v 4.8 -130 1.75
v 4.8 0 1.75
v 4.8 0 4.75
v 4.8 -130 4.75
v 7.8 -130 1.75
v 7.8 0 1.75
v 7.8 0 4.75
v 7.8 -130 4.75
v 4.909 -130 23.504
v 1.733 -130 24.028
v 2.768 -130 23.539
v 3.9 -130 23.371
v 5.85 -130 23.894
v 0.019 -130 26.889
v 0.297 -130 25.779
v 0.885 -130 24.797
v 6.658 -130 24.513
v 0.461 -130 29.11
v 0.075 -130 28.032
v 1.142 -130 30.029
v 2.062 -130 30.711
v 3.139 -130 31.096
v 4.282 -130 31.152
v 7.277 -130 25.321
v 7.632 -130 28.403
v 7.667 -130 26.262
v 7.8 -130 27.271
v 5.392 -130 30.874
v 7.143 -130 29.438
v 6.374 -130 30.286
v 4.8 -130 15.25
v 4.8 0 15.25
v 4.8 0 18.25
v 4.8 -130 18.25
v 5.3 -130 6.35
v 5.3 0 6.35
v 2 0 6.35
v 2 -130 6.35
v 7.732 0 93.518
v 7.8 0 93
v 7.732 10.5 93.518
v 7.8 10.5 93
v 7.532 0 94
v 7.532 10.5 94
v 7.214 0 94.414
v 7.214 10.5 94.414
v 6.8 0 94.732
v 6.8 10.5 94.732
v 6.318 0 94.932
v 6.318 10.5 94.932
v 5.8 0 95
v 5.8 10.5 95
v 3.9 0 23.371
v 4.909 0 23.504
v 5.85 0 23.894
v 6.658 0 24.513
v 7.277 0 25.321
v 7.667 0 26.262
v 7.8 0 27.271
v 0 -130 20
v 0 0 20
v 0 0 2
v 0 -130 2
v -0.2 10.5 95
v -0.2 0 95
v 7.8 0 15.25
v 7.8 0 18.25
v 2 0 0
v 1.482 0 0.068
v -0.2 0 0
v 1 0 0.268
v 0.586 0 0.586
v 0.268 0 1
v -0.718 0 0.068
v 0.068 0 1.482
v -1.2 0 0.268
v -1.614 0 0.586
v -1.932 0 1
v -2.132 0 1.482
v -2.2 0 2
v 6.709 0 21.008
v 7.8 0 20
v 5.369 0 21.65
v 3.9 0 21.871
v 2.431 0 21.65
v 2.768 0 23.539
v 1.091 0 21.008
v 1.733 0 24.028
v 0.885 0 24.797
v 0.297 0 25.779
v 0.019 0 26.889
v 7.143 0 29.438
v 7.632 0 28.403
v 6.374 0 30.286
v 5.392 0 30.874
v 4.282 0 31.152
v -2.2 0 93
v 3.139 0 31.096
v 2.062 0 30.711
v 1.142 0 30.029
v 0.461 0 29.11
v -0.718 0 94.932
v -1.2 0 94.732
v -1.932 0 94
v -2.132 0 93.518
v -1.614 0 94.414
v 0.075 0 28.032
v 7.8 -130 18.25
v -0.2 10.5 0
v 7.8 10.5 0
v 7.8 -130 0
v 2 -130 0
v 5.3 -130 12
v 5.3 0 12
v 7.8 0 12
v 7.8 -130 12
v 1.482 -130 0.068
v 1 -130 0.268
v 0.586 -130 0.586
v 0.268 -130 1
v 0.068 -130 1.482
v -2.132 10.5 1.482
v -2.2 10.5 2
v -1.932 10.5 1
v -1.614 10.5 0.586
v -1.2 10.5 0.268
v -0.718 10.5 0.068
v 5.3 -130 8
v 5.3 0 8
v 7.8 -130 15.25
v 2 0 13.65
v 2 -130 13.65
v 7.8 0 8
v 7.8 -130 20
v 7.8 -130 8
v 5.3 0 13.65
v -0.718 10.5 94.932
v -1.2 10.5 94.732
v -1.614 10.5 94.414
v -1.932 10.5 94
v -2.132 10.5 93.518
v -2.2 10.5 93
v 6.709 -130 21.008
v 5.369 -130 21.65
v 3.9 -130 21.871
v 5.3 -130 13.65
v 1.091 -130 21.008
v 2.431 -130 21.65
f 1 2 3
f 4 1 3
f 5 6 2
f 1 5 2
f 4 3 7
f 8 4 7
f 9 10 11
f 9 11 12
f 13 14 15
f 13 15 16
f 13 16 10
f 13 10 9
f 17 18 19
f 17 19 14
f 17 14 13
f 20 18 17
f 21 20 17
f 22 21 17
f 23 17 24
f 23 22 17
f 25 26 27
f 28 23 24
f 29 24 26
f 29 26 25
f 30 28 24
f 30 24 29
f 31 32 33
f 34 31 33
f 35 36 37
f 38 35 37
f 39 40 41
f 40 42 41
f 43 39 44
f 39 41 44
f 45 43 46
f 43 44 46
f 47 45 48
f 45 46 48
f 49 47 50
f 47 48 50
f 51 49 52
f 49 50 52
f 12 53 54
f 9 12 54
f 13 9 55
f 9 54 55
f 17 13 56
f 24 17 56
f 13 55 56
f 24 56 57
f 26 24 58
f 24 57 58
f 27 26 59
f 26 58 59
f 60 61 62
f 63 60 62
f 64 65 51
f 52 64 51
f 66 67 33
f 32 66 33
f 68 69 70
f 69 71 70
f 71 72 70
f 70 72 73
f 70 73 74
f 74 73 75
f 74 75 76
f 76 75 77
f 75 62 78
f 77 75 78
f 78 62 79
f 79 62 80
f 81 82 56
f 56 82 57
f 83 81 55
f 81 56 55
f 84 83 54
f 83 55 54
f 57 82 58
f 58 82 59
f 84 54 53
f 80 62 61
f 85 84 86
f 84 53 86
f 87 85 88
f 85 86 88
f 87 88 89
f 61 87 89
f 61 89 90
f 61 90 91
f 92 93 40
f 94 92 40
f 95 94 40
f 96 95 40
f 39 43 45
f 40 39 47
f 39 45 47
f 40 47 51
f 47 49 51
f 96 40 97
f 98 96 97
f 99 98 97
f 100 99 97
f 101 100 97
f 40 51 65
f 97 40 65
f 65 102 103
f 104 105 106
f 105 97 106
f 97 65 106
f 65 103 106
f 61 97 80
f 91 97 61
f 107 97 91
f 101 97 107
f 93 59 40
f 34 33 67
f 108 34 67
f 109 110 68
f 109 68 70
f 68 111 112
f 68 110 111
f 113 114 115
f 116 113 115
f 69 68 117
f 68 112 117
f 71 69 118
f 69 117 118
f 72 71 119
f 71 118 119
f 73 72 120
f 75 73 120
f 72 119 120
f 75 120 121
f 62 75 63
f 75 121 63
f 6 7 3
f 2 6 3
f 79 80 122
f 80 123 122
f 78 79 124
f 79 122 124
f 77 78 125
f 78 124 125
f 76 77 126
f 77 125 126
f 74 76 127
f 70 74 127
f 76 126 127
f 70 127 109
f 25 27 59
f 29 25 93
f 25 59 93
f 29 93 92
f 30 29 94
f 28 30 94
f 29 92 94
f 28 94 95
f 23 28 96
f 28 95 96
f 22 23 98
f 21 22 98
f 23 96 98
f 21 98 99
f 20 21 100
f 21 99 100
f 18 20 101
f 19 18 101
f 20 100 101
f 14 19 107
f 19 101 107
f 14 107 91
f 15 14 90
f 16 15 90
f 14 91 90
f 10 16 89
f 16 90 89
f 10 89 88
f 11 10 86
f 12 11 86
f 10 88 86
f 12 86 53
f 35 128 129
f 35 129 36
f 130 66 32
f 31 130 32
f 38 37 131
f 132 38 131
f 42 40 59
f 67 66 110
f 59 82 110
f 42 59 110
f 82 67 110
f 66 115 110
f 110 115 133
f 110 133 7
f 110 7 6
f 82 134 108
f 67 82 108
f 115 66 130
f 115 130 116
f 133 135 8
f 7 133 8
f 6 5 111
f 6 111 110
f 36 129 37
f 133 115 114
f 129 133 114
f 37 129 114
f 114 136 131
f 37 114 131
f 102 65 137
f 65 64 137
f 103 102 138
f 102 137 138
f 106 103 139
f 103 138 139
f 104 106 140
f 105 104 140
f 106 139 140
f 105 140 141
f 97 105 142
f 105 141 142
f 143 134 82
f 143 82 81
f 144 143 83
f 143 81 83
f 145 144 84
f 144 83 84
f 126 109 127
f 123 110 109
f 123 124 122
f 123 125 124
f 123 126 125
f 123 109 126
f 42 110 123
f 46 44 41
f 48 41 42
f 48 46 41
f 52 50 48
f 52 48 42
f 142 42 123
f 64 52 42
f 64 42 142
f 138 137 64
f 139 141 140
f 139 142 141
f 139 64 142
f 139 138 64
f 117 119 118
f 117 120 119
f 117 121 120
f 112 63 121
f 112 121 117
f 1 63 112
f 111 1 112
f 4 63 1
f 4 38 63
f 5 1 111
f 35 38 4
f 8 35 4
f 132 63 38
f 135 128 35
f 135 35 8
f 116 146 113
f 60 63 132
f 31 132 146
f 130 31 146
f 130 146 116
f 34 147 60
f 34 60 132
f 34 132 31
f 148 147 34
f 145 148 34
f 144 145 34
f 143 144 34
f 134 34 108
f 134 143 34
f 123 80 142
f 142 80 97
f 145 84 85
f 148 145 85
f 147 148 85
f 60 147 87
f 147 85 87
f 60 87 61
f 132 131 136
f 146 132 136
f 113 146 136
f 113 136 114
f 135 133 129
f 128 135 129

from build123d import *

# Parameters (mm, degrees)
F1_DEPTH = 130
F2_W     = 7.8
F2_H     = 75
F2_H_2   = 20
F3_DEPTH = 10.5
F5_DEPTH = 130
F6_R     = 2
F7_R     = 2


with BuildPart() as f1:
    # F0 (on Front) → F1 (new body)
    with BuildSketch(Plane.XZ):
        Polygon((0, 10), (0, 0), (7.8, 0), (7.8, 1.75), (4.8, 1.75), (4.8, 4.75), (7.8, 4.75), (7.8, 8), (5.3, 8), (5.3, 6.35), (2, 6.35), (2, 10), align=None)
        Polygon((0, 20), (0, 10), (2, 10), (2, 13.65), (5.3, 13.65), (5.3, 12), (7.8, 12), (7.8, 15.25), (4.8, 15.25), (4.8, 18.25), (7.8, 18.25), (7.8, 20), align=None)
    extrude(amount=F1_DEPTH)

    # F2 (on face) → F3 (join)
    with BuildSketch(Plane(origin=(0, 0, 0), x_dir=(-1, 0, 0), z_dir=(0, 1, 0))):
        with Locations((-3.9, 57.5)):
            Rectangle(F2_W, F2_H)
        with Locations((-3.9, 10)):
            Rectangle(F2_W, F2_H_2)
        Polygon((0, 95), (0, 20), (0, 0), (2.2, 0), (2.2, 95), align=None)
    extrude(amount=F3_DEPTH)

    # F4 (on face) → F5 (join, through all)
    with BuildSketch(Plane.XZ):
        with BuildLine():
            Line((3.9, 20), (7.8, 20))
            ThreePointArc((7.8, 20), (6.062812, 21.379122), (3.9, 21.871102))
            Line((3.9, 21.871102), (3.9, 20))
        make_face()
        with BuildLine():
            Line((3.9, 20), (3.9, 21.871102))
            ThreePointArc((3.9, 21.871102), (1.737188, 21.379122), (0, 20))
            Line((0, 20), (3.9, 20))
        make_face()
        with BuildLine():
            ThreePointArc((3.9, 23.371102), (6.657716, 24.513386), (7.8, 27.271102))
            ThreePointArc((7.8, 27.271102), (1.142284, 30.028819), (3.9, 23.371102))
        make_face()
    extrude(amount=F5_DEPTH)

    # F6
    f6_edges = [f1.edges().sort_by_distance(p)[0] for p in [
        (0, -65, 0),
        (7.8, 5.25, 95),
        (-2.2, 5.25, 95),
    ]]
    fillet(f6_edges, radius=F6_R)

    # F7
    f7_edges = [f1.edges().sort_by_distance(p)[0] for p in [
        (-2.2, 5.25, 0),
    ]]
    fillet(f7_edges, radius=F7_R)


solid = f1.part
